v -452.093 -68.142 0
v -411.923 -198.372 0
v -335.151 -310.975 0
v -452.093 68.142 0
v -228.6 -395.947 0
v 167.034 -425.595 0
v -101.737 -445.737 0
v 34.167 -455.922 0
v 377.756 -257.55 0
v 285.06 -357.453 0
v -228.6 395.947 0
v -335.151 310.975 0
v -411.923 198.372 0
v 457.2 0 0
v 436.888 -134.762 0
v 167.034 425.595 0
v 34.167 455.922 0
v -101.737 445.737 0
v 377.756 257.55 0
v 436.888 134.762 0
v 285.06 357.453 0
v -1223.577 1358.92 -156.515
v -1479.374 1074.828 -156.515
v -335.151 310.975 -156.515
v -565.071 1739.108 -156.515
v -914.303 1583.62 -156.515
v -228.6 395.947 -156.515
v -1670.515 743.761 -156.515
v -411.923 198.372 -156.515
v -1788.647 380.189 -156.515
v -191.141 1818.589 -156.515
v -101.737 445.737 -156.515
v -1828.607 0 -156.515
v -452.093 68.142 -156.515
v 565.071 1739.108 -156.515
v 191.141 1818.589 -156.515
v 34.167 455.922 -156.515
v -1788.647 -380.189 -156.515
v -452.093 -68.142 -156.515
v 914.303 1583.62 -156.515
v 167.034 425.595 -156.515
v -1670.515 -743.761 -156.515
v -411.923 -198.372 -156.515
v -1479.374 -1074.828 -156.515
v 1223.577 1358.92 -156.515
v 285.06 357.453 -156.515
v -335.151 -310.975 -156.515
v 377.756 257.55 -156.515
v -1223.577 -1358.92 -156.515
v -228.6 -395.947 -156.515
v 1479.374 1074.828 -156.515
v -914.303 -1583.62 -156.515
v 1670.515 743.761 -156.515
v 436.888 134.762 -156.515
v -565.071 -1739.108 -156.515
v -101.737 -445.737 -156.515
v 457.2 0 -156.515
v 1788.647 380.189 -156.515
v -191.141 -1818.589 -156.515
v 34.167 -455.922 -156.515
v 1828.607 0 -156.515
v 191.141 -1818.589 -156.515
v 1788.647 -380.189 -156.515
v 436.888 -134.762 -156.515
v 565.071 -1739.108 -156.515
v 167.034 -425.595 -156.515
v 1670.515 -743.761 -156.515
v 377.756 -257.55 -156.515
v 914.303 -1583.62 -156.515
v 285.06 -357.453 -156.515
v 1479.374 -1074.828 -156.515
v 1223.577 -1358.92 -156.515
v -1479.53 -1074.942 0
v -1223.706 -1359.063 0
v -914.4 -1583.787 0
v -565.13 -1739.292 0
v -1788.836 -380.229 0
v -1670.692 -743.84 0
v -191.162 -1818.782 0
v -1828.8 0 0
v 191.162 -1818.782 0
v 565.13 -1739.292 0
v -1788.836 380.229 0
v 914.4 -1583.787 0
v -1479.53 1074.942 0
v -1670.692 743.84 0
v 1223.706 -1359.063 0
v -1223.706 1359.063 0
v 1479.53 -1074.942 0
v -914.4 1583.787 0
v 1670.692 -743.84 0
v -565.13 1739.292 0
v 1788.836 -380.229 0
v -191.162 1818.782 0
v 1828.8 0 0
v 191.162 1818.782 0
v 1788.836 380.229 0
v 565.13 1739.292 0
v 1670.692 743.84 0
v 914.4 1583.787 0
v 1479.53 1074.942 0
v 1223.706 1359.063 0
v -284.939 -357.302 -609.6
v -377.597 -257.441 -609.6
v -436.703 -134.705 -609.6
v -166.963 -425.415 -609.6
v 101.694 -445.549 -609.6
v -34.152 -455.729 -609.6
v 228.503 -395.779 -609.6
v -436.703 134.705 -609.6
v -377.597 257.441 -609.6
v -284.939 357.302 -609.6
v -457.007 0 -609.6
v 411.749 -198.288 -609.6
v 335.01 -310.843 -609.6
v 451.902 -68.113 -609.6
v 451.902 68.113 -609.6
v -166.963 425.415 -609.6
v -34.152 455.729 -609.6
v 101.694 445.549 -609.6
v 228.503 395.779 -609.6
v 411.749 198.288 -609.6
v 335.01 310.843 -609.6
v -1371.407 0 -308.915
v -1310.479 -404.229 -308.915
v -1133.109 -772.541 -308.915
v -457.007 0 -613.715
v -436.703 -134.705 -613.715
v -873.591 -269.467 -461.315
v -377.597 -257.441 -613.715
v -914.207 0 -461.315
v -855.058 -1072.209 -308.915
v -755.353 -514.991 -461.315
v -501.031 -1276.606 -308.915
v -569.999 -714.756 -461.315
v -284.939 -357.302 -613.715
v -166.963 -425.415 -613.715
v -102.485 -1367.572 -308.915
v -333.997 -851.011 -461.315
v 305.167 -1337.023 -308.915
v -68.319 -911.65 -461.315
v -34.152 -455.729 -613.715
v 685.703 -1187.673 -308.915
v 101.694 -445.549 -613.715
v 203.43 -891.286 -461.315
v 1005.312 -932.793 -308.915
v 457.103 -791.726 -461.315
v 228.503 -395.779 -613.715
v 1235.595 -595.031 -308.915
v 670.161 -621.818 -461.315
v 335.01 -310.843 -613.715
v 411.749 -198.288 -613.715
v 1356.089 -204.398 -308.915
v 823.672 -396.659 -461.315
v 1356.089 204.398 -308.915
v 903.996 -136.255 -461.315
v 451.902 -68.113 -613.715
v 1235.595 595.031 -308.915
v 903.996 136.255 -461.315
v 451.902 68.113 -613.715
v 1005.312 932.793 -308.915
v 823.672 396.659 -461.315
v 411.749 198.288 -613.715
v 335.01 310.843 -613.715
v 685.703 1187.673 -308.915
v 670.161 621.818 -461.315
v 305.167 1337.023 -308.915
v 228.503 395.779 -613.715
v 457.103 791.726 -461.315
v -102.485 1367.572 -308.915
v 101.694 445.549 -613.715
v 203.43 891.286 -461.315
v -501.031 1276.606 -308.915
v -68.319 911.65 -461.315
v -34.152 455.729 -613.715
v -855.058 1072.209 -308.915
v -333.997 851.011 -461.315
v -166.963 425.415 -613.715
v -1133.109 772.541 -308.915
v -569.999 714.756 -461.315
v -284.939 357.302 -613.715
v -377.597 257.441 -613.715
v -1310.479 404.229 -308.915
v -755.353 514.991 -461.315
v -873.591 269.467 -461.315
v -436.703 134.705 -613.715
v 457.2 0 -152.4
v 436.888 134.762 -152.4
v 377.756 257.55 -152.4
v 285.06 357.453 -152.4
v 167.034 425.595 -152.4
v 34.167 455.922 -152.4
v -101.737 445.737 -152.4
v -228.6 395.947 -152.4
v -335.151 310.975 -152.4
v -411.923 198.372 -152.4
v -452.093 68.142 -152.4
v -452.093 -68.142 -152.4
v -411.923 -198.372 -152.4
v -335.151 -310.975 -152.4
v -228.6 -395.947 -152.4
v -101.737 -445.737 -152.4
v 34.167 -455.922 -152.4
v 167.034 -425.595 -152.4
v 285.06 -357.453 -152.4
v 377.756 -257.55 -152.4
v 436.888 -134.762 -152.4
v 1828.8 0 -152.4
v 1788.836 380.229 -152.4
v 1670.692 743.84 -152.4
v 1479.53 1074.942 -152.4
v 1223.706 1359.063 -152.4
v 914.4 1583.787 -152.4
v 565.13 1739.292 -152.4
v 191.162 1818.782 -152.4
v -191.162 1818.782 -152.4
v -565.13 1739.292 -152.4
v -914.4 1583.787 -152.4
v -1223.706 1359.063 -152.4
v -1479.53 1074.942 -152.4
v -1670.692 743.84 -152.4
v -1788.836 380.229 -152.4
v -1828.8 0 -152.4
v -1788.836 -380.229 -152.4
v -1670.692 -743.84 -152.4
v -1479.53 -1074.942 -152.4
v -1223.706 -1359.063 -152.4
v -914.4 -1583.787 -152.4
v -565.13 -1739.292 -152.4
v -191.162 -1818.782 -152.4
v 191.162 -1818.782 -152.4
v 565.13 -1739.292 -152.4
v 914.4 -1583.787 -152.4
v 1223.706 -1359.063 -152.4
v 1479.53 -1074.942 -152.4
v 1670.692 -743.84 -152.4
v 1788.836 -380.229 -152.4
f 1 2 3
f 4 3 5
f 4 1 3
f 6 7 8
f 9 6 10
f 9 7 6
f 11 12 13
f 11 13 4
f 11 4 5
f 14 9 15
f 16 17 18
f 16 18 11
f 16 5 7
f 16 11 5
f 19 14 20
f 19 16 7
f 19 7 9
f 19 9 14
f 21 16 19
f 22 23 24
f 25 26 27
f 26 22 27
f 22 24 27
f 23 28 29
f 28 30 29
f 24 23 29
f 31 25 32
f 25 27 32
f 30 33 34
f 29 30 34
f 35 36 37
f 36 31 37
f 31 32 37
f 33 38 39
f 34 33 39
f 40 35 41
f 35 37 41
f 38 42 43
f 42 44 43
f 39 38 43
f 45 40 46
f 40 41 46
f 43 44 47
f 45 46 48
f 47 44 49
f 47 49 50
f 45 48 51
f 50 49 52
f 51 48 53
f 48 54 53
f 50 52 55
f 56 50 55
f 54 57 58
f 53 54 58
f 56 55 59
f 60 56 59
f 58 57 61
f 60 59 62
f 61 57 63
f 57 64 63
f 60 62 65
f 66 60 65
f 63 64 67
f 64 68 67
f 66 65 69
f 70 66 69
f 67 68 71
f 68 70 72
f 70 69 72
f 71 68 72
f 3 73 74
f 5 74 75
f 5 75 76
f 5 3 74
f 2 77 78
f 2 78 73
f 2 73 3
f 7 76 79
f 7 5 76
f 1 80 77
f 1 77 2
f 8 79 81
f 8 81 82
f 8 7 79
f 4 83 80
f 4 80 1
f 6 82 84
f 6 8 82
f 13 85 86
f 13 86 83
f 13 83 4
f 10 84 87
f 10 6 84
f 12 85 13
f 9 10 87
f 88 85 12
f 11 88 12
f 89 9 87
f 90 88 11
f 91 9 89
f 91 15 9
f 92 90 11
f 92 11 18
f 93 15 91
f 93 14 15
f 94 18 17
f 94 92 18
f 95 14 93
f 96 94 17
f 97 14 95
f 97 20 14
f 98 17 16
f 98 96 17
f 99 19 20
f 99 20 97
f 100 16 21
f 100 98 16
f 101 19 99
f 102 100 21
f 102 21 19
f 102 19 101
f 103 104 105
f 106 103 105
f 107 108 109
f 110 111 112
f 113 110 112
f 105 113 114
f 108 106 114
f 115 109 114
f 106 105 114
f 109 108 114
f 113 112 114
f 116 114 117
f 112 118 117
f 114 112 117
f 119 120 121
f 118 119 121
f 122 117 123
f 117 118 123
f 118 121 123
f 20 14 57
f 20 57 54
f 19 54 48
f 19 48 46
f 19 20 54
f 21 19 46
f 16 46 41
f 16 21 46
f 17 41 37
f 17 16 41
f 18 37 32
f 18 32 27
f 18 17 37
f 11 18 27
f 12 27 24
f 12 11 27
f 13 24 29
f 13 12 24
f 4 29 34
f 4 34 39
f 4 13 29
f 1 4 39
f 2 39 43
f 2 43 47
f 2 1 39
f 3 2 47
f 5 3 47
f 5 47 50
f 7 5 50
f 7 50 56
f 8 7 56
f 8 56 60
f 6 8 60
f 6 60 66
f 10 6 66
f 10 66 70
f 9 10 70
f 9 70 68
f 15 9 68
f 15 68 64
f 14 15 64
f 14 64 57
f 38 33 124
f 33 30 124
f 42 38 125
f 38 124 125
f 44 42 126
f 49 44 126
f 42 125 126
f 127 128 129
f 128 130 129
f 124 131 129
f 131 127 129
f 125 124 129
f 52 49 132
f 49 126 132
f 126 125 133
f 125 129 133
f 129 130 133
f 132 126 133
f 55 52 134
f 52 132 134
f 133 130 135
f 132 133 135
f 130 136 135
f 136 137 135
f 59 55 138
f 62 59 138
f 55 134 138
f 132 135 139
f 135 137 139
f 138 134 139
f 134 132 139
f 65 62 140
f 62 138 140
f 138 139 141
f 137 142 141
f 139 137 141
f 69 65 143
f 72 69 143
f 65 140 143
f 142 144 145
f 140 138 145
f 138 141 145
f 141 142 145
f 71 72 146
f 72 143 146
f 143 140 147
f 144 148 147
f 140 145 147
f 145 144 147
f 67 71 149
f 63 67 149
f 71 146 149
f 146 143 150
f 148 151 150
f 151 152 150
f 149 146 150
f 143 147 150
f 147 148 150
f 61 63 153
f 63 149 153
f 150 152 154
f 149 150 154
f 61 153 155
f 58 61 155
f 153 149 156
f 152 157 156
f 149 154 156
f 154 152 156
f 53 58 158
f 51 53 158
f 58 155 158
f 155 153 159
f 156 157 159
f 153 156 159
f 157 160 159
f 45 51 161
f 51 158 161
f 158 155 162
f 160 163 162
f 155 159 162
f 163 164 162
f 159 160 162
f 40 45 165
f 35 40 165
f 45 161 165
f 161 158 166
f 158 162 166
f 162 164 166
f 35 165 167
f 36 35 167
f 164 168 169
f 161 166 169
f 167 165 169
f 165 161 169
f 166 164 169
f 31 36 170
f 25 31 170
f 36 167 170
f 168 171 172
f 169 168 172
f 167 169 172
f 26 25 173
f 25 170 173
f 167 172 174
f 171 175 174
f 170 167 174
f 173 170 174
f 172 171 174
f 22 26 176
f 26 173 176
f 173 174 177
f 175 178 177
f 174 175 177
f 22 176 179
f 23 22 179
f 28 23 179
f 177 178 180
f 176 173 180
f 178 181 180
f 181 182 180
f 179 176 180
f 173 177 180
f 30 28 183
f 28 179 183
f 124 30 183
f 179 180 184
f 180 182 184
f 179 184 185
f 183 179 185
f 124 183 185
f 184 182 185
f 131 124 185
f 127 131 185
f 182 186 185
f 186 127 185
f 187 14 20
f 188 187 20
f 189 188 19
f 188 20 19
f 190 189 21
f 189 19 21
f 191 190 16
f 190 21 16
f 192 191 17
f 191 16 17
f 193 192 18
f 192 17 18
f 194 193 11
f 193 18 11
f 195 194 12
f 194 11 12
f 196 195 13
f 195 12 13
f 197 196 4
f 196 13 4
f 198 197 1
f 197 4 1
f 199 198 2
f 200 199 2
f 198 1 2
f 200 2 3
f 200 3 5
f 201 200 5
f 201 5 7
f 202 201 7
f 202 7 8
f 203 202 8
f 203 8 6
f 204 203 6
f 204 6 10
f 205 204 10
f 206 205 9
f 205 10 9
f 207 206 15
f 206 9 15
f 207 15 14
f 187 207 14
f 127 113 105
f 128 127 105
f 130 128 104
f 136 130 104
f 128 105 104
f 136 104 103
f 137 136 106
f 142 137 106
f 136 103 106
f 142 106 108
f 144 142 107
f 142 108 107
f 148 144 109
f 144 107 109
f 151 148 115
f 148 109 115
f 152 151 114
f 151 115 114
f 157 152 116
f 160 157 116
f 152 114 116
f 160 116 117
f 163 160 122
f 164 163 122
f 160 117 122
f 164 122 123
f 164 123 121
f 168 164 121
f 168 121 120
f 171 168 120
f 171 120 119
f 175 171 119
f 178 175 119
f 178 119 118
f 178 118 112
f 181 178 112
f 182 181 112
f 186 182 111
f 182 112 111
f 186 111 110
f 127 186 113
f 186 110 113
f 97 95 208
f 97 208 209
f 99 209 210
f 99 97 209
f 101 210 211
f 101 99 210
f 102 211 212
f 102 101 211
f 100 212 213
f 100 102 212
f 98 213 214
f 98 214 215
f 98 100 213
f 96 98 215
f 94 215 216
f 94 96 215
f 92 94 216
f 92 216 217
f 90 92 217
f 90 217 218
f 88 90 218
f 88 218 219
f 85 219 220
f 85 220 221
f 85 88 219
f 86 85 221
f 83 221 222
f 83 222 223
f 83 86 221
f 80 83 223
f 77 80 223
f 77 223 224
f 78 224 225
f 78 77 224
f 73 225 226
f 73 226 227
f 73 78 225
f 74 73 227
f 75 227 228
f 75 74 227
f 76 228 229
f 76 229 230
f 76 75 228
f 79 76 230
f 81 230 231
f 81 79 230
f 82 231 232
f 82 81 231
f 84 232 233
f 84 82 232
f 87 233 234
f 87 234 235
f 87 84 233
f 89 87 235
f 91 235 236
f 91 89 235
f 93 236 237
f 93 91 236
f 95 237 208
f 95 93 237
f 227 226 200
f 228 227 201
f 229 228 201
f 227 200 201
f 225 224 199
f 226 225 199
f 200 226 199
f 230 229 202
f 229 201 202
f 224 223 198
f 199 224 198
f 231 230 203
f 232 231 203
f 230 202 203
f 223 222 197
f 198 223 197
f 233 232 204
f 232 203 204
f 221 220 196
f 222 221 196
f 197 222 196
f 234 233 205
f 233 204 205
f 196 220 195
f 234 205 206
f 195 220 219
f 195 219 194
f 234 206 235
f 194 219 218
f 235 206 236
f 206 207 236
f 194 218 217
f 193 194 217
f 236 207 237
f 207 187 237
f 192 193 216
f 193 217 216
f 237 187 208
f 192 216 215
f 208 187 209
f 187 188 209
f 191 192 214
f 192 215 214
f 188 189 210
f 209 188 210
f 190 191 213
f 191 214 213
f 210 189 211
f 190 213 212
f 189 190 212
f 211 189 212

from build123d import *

# Parameters (mm, degrees)
F1_R     = 457.2
F2_DEPTH = 609.6
F0_R     = 1828.8
F0_R_2   = 457.2
F3_DEPTH = 152.4


with BuildPart() as f2:
    # F1 (on Top) → F2 (new body)
    with BuildSketch(Plane.XY):
        Circle(F1_R)
    extrude(amount=-F2_DEPTH)

    # F4 (on Front) → F5 (revolve)
    with BuildSketch(Plane.XZ):
        Polygon((-457.006649, -156.514913), (-1828.606649, -156.514913), (-457.006649, -613.714913), align=None)
    revolve(axis=Axis((0, 0, -609.6), (0, 0, 1)))


with BuildPart() as f3:
    # F0 (on Top) → F3 (new body)
    with BuildSketch(Plane.XY):
        Circle(F0_R)
        Circle(F0_R_2, mode=Mode.SUBTRACT)
    extrude(amount=-F3_DEPTH)


solid = Compound([f2.part, f3.part])
